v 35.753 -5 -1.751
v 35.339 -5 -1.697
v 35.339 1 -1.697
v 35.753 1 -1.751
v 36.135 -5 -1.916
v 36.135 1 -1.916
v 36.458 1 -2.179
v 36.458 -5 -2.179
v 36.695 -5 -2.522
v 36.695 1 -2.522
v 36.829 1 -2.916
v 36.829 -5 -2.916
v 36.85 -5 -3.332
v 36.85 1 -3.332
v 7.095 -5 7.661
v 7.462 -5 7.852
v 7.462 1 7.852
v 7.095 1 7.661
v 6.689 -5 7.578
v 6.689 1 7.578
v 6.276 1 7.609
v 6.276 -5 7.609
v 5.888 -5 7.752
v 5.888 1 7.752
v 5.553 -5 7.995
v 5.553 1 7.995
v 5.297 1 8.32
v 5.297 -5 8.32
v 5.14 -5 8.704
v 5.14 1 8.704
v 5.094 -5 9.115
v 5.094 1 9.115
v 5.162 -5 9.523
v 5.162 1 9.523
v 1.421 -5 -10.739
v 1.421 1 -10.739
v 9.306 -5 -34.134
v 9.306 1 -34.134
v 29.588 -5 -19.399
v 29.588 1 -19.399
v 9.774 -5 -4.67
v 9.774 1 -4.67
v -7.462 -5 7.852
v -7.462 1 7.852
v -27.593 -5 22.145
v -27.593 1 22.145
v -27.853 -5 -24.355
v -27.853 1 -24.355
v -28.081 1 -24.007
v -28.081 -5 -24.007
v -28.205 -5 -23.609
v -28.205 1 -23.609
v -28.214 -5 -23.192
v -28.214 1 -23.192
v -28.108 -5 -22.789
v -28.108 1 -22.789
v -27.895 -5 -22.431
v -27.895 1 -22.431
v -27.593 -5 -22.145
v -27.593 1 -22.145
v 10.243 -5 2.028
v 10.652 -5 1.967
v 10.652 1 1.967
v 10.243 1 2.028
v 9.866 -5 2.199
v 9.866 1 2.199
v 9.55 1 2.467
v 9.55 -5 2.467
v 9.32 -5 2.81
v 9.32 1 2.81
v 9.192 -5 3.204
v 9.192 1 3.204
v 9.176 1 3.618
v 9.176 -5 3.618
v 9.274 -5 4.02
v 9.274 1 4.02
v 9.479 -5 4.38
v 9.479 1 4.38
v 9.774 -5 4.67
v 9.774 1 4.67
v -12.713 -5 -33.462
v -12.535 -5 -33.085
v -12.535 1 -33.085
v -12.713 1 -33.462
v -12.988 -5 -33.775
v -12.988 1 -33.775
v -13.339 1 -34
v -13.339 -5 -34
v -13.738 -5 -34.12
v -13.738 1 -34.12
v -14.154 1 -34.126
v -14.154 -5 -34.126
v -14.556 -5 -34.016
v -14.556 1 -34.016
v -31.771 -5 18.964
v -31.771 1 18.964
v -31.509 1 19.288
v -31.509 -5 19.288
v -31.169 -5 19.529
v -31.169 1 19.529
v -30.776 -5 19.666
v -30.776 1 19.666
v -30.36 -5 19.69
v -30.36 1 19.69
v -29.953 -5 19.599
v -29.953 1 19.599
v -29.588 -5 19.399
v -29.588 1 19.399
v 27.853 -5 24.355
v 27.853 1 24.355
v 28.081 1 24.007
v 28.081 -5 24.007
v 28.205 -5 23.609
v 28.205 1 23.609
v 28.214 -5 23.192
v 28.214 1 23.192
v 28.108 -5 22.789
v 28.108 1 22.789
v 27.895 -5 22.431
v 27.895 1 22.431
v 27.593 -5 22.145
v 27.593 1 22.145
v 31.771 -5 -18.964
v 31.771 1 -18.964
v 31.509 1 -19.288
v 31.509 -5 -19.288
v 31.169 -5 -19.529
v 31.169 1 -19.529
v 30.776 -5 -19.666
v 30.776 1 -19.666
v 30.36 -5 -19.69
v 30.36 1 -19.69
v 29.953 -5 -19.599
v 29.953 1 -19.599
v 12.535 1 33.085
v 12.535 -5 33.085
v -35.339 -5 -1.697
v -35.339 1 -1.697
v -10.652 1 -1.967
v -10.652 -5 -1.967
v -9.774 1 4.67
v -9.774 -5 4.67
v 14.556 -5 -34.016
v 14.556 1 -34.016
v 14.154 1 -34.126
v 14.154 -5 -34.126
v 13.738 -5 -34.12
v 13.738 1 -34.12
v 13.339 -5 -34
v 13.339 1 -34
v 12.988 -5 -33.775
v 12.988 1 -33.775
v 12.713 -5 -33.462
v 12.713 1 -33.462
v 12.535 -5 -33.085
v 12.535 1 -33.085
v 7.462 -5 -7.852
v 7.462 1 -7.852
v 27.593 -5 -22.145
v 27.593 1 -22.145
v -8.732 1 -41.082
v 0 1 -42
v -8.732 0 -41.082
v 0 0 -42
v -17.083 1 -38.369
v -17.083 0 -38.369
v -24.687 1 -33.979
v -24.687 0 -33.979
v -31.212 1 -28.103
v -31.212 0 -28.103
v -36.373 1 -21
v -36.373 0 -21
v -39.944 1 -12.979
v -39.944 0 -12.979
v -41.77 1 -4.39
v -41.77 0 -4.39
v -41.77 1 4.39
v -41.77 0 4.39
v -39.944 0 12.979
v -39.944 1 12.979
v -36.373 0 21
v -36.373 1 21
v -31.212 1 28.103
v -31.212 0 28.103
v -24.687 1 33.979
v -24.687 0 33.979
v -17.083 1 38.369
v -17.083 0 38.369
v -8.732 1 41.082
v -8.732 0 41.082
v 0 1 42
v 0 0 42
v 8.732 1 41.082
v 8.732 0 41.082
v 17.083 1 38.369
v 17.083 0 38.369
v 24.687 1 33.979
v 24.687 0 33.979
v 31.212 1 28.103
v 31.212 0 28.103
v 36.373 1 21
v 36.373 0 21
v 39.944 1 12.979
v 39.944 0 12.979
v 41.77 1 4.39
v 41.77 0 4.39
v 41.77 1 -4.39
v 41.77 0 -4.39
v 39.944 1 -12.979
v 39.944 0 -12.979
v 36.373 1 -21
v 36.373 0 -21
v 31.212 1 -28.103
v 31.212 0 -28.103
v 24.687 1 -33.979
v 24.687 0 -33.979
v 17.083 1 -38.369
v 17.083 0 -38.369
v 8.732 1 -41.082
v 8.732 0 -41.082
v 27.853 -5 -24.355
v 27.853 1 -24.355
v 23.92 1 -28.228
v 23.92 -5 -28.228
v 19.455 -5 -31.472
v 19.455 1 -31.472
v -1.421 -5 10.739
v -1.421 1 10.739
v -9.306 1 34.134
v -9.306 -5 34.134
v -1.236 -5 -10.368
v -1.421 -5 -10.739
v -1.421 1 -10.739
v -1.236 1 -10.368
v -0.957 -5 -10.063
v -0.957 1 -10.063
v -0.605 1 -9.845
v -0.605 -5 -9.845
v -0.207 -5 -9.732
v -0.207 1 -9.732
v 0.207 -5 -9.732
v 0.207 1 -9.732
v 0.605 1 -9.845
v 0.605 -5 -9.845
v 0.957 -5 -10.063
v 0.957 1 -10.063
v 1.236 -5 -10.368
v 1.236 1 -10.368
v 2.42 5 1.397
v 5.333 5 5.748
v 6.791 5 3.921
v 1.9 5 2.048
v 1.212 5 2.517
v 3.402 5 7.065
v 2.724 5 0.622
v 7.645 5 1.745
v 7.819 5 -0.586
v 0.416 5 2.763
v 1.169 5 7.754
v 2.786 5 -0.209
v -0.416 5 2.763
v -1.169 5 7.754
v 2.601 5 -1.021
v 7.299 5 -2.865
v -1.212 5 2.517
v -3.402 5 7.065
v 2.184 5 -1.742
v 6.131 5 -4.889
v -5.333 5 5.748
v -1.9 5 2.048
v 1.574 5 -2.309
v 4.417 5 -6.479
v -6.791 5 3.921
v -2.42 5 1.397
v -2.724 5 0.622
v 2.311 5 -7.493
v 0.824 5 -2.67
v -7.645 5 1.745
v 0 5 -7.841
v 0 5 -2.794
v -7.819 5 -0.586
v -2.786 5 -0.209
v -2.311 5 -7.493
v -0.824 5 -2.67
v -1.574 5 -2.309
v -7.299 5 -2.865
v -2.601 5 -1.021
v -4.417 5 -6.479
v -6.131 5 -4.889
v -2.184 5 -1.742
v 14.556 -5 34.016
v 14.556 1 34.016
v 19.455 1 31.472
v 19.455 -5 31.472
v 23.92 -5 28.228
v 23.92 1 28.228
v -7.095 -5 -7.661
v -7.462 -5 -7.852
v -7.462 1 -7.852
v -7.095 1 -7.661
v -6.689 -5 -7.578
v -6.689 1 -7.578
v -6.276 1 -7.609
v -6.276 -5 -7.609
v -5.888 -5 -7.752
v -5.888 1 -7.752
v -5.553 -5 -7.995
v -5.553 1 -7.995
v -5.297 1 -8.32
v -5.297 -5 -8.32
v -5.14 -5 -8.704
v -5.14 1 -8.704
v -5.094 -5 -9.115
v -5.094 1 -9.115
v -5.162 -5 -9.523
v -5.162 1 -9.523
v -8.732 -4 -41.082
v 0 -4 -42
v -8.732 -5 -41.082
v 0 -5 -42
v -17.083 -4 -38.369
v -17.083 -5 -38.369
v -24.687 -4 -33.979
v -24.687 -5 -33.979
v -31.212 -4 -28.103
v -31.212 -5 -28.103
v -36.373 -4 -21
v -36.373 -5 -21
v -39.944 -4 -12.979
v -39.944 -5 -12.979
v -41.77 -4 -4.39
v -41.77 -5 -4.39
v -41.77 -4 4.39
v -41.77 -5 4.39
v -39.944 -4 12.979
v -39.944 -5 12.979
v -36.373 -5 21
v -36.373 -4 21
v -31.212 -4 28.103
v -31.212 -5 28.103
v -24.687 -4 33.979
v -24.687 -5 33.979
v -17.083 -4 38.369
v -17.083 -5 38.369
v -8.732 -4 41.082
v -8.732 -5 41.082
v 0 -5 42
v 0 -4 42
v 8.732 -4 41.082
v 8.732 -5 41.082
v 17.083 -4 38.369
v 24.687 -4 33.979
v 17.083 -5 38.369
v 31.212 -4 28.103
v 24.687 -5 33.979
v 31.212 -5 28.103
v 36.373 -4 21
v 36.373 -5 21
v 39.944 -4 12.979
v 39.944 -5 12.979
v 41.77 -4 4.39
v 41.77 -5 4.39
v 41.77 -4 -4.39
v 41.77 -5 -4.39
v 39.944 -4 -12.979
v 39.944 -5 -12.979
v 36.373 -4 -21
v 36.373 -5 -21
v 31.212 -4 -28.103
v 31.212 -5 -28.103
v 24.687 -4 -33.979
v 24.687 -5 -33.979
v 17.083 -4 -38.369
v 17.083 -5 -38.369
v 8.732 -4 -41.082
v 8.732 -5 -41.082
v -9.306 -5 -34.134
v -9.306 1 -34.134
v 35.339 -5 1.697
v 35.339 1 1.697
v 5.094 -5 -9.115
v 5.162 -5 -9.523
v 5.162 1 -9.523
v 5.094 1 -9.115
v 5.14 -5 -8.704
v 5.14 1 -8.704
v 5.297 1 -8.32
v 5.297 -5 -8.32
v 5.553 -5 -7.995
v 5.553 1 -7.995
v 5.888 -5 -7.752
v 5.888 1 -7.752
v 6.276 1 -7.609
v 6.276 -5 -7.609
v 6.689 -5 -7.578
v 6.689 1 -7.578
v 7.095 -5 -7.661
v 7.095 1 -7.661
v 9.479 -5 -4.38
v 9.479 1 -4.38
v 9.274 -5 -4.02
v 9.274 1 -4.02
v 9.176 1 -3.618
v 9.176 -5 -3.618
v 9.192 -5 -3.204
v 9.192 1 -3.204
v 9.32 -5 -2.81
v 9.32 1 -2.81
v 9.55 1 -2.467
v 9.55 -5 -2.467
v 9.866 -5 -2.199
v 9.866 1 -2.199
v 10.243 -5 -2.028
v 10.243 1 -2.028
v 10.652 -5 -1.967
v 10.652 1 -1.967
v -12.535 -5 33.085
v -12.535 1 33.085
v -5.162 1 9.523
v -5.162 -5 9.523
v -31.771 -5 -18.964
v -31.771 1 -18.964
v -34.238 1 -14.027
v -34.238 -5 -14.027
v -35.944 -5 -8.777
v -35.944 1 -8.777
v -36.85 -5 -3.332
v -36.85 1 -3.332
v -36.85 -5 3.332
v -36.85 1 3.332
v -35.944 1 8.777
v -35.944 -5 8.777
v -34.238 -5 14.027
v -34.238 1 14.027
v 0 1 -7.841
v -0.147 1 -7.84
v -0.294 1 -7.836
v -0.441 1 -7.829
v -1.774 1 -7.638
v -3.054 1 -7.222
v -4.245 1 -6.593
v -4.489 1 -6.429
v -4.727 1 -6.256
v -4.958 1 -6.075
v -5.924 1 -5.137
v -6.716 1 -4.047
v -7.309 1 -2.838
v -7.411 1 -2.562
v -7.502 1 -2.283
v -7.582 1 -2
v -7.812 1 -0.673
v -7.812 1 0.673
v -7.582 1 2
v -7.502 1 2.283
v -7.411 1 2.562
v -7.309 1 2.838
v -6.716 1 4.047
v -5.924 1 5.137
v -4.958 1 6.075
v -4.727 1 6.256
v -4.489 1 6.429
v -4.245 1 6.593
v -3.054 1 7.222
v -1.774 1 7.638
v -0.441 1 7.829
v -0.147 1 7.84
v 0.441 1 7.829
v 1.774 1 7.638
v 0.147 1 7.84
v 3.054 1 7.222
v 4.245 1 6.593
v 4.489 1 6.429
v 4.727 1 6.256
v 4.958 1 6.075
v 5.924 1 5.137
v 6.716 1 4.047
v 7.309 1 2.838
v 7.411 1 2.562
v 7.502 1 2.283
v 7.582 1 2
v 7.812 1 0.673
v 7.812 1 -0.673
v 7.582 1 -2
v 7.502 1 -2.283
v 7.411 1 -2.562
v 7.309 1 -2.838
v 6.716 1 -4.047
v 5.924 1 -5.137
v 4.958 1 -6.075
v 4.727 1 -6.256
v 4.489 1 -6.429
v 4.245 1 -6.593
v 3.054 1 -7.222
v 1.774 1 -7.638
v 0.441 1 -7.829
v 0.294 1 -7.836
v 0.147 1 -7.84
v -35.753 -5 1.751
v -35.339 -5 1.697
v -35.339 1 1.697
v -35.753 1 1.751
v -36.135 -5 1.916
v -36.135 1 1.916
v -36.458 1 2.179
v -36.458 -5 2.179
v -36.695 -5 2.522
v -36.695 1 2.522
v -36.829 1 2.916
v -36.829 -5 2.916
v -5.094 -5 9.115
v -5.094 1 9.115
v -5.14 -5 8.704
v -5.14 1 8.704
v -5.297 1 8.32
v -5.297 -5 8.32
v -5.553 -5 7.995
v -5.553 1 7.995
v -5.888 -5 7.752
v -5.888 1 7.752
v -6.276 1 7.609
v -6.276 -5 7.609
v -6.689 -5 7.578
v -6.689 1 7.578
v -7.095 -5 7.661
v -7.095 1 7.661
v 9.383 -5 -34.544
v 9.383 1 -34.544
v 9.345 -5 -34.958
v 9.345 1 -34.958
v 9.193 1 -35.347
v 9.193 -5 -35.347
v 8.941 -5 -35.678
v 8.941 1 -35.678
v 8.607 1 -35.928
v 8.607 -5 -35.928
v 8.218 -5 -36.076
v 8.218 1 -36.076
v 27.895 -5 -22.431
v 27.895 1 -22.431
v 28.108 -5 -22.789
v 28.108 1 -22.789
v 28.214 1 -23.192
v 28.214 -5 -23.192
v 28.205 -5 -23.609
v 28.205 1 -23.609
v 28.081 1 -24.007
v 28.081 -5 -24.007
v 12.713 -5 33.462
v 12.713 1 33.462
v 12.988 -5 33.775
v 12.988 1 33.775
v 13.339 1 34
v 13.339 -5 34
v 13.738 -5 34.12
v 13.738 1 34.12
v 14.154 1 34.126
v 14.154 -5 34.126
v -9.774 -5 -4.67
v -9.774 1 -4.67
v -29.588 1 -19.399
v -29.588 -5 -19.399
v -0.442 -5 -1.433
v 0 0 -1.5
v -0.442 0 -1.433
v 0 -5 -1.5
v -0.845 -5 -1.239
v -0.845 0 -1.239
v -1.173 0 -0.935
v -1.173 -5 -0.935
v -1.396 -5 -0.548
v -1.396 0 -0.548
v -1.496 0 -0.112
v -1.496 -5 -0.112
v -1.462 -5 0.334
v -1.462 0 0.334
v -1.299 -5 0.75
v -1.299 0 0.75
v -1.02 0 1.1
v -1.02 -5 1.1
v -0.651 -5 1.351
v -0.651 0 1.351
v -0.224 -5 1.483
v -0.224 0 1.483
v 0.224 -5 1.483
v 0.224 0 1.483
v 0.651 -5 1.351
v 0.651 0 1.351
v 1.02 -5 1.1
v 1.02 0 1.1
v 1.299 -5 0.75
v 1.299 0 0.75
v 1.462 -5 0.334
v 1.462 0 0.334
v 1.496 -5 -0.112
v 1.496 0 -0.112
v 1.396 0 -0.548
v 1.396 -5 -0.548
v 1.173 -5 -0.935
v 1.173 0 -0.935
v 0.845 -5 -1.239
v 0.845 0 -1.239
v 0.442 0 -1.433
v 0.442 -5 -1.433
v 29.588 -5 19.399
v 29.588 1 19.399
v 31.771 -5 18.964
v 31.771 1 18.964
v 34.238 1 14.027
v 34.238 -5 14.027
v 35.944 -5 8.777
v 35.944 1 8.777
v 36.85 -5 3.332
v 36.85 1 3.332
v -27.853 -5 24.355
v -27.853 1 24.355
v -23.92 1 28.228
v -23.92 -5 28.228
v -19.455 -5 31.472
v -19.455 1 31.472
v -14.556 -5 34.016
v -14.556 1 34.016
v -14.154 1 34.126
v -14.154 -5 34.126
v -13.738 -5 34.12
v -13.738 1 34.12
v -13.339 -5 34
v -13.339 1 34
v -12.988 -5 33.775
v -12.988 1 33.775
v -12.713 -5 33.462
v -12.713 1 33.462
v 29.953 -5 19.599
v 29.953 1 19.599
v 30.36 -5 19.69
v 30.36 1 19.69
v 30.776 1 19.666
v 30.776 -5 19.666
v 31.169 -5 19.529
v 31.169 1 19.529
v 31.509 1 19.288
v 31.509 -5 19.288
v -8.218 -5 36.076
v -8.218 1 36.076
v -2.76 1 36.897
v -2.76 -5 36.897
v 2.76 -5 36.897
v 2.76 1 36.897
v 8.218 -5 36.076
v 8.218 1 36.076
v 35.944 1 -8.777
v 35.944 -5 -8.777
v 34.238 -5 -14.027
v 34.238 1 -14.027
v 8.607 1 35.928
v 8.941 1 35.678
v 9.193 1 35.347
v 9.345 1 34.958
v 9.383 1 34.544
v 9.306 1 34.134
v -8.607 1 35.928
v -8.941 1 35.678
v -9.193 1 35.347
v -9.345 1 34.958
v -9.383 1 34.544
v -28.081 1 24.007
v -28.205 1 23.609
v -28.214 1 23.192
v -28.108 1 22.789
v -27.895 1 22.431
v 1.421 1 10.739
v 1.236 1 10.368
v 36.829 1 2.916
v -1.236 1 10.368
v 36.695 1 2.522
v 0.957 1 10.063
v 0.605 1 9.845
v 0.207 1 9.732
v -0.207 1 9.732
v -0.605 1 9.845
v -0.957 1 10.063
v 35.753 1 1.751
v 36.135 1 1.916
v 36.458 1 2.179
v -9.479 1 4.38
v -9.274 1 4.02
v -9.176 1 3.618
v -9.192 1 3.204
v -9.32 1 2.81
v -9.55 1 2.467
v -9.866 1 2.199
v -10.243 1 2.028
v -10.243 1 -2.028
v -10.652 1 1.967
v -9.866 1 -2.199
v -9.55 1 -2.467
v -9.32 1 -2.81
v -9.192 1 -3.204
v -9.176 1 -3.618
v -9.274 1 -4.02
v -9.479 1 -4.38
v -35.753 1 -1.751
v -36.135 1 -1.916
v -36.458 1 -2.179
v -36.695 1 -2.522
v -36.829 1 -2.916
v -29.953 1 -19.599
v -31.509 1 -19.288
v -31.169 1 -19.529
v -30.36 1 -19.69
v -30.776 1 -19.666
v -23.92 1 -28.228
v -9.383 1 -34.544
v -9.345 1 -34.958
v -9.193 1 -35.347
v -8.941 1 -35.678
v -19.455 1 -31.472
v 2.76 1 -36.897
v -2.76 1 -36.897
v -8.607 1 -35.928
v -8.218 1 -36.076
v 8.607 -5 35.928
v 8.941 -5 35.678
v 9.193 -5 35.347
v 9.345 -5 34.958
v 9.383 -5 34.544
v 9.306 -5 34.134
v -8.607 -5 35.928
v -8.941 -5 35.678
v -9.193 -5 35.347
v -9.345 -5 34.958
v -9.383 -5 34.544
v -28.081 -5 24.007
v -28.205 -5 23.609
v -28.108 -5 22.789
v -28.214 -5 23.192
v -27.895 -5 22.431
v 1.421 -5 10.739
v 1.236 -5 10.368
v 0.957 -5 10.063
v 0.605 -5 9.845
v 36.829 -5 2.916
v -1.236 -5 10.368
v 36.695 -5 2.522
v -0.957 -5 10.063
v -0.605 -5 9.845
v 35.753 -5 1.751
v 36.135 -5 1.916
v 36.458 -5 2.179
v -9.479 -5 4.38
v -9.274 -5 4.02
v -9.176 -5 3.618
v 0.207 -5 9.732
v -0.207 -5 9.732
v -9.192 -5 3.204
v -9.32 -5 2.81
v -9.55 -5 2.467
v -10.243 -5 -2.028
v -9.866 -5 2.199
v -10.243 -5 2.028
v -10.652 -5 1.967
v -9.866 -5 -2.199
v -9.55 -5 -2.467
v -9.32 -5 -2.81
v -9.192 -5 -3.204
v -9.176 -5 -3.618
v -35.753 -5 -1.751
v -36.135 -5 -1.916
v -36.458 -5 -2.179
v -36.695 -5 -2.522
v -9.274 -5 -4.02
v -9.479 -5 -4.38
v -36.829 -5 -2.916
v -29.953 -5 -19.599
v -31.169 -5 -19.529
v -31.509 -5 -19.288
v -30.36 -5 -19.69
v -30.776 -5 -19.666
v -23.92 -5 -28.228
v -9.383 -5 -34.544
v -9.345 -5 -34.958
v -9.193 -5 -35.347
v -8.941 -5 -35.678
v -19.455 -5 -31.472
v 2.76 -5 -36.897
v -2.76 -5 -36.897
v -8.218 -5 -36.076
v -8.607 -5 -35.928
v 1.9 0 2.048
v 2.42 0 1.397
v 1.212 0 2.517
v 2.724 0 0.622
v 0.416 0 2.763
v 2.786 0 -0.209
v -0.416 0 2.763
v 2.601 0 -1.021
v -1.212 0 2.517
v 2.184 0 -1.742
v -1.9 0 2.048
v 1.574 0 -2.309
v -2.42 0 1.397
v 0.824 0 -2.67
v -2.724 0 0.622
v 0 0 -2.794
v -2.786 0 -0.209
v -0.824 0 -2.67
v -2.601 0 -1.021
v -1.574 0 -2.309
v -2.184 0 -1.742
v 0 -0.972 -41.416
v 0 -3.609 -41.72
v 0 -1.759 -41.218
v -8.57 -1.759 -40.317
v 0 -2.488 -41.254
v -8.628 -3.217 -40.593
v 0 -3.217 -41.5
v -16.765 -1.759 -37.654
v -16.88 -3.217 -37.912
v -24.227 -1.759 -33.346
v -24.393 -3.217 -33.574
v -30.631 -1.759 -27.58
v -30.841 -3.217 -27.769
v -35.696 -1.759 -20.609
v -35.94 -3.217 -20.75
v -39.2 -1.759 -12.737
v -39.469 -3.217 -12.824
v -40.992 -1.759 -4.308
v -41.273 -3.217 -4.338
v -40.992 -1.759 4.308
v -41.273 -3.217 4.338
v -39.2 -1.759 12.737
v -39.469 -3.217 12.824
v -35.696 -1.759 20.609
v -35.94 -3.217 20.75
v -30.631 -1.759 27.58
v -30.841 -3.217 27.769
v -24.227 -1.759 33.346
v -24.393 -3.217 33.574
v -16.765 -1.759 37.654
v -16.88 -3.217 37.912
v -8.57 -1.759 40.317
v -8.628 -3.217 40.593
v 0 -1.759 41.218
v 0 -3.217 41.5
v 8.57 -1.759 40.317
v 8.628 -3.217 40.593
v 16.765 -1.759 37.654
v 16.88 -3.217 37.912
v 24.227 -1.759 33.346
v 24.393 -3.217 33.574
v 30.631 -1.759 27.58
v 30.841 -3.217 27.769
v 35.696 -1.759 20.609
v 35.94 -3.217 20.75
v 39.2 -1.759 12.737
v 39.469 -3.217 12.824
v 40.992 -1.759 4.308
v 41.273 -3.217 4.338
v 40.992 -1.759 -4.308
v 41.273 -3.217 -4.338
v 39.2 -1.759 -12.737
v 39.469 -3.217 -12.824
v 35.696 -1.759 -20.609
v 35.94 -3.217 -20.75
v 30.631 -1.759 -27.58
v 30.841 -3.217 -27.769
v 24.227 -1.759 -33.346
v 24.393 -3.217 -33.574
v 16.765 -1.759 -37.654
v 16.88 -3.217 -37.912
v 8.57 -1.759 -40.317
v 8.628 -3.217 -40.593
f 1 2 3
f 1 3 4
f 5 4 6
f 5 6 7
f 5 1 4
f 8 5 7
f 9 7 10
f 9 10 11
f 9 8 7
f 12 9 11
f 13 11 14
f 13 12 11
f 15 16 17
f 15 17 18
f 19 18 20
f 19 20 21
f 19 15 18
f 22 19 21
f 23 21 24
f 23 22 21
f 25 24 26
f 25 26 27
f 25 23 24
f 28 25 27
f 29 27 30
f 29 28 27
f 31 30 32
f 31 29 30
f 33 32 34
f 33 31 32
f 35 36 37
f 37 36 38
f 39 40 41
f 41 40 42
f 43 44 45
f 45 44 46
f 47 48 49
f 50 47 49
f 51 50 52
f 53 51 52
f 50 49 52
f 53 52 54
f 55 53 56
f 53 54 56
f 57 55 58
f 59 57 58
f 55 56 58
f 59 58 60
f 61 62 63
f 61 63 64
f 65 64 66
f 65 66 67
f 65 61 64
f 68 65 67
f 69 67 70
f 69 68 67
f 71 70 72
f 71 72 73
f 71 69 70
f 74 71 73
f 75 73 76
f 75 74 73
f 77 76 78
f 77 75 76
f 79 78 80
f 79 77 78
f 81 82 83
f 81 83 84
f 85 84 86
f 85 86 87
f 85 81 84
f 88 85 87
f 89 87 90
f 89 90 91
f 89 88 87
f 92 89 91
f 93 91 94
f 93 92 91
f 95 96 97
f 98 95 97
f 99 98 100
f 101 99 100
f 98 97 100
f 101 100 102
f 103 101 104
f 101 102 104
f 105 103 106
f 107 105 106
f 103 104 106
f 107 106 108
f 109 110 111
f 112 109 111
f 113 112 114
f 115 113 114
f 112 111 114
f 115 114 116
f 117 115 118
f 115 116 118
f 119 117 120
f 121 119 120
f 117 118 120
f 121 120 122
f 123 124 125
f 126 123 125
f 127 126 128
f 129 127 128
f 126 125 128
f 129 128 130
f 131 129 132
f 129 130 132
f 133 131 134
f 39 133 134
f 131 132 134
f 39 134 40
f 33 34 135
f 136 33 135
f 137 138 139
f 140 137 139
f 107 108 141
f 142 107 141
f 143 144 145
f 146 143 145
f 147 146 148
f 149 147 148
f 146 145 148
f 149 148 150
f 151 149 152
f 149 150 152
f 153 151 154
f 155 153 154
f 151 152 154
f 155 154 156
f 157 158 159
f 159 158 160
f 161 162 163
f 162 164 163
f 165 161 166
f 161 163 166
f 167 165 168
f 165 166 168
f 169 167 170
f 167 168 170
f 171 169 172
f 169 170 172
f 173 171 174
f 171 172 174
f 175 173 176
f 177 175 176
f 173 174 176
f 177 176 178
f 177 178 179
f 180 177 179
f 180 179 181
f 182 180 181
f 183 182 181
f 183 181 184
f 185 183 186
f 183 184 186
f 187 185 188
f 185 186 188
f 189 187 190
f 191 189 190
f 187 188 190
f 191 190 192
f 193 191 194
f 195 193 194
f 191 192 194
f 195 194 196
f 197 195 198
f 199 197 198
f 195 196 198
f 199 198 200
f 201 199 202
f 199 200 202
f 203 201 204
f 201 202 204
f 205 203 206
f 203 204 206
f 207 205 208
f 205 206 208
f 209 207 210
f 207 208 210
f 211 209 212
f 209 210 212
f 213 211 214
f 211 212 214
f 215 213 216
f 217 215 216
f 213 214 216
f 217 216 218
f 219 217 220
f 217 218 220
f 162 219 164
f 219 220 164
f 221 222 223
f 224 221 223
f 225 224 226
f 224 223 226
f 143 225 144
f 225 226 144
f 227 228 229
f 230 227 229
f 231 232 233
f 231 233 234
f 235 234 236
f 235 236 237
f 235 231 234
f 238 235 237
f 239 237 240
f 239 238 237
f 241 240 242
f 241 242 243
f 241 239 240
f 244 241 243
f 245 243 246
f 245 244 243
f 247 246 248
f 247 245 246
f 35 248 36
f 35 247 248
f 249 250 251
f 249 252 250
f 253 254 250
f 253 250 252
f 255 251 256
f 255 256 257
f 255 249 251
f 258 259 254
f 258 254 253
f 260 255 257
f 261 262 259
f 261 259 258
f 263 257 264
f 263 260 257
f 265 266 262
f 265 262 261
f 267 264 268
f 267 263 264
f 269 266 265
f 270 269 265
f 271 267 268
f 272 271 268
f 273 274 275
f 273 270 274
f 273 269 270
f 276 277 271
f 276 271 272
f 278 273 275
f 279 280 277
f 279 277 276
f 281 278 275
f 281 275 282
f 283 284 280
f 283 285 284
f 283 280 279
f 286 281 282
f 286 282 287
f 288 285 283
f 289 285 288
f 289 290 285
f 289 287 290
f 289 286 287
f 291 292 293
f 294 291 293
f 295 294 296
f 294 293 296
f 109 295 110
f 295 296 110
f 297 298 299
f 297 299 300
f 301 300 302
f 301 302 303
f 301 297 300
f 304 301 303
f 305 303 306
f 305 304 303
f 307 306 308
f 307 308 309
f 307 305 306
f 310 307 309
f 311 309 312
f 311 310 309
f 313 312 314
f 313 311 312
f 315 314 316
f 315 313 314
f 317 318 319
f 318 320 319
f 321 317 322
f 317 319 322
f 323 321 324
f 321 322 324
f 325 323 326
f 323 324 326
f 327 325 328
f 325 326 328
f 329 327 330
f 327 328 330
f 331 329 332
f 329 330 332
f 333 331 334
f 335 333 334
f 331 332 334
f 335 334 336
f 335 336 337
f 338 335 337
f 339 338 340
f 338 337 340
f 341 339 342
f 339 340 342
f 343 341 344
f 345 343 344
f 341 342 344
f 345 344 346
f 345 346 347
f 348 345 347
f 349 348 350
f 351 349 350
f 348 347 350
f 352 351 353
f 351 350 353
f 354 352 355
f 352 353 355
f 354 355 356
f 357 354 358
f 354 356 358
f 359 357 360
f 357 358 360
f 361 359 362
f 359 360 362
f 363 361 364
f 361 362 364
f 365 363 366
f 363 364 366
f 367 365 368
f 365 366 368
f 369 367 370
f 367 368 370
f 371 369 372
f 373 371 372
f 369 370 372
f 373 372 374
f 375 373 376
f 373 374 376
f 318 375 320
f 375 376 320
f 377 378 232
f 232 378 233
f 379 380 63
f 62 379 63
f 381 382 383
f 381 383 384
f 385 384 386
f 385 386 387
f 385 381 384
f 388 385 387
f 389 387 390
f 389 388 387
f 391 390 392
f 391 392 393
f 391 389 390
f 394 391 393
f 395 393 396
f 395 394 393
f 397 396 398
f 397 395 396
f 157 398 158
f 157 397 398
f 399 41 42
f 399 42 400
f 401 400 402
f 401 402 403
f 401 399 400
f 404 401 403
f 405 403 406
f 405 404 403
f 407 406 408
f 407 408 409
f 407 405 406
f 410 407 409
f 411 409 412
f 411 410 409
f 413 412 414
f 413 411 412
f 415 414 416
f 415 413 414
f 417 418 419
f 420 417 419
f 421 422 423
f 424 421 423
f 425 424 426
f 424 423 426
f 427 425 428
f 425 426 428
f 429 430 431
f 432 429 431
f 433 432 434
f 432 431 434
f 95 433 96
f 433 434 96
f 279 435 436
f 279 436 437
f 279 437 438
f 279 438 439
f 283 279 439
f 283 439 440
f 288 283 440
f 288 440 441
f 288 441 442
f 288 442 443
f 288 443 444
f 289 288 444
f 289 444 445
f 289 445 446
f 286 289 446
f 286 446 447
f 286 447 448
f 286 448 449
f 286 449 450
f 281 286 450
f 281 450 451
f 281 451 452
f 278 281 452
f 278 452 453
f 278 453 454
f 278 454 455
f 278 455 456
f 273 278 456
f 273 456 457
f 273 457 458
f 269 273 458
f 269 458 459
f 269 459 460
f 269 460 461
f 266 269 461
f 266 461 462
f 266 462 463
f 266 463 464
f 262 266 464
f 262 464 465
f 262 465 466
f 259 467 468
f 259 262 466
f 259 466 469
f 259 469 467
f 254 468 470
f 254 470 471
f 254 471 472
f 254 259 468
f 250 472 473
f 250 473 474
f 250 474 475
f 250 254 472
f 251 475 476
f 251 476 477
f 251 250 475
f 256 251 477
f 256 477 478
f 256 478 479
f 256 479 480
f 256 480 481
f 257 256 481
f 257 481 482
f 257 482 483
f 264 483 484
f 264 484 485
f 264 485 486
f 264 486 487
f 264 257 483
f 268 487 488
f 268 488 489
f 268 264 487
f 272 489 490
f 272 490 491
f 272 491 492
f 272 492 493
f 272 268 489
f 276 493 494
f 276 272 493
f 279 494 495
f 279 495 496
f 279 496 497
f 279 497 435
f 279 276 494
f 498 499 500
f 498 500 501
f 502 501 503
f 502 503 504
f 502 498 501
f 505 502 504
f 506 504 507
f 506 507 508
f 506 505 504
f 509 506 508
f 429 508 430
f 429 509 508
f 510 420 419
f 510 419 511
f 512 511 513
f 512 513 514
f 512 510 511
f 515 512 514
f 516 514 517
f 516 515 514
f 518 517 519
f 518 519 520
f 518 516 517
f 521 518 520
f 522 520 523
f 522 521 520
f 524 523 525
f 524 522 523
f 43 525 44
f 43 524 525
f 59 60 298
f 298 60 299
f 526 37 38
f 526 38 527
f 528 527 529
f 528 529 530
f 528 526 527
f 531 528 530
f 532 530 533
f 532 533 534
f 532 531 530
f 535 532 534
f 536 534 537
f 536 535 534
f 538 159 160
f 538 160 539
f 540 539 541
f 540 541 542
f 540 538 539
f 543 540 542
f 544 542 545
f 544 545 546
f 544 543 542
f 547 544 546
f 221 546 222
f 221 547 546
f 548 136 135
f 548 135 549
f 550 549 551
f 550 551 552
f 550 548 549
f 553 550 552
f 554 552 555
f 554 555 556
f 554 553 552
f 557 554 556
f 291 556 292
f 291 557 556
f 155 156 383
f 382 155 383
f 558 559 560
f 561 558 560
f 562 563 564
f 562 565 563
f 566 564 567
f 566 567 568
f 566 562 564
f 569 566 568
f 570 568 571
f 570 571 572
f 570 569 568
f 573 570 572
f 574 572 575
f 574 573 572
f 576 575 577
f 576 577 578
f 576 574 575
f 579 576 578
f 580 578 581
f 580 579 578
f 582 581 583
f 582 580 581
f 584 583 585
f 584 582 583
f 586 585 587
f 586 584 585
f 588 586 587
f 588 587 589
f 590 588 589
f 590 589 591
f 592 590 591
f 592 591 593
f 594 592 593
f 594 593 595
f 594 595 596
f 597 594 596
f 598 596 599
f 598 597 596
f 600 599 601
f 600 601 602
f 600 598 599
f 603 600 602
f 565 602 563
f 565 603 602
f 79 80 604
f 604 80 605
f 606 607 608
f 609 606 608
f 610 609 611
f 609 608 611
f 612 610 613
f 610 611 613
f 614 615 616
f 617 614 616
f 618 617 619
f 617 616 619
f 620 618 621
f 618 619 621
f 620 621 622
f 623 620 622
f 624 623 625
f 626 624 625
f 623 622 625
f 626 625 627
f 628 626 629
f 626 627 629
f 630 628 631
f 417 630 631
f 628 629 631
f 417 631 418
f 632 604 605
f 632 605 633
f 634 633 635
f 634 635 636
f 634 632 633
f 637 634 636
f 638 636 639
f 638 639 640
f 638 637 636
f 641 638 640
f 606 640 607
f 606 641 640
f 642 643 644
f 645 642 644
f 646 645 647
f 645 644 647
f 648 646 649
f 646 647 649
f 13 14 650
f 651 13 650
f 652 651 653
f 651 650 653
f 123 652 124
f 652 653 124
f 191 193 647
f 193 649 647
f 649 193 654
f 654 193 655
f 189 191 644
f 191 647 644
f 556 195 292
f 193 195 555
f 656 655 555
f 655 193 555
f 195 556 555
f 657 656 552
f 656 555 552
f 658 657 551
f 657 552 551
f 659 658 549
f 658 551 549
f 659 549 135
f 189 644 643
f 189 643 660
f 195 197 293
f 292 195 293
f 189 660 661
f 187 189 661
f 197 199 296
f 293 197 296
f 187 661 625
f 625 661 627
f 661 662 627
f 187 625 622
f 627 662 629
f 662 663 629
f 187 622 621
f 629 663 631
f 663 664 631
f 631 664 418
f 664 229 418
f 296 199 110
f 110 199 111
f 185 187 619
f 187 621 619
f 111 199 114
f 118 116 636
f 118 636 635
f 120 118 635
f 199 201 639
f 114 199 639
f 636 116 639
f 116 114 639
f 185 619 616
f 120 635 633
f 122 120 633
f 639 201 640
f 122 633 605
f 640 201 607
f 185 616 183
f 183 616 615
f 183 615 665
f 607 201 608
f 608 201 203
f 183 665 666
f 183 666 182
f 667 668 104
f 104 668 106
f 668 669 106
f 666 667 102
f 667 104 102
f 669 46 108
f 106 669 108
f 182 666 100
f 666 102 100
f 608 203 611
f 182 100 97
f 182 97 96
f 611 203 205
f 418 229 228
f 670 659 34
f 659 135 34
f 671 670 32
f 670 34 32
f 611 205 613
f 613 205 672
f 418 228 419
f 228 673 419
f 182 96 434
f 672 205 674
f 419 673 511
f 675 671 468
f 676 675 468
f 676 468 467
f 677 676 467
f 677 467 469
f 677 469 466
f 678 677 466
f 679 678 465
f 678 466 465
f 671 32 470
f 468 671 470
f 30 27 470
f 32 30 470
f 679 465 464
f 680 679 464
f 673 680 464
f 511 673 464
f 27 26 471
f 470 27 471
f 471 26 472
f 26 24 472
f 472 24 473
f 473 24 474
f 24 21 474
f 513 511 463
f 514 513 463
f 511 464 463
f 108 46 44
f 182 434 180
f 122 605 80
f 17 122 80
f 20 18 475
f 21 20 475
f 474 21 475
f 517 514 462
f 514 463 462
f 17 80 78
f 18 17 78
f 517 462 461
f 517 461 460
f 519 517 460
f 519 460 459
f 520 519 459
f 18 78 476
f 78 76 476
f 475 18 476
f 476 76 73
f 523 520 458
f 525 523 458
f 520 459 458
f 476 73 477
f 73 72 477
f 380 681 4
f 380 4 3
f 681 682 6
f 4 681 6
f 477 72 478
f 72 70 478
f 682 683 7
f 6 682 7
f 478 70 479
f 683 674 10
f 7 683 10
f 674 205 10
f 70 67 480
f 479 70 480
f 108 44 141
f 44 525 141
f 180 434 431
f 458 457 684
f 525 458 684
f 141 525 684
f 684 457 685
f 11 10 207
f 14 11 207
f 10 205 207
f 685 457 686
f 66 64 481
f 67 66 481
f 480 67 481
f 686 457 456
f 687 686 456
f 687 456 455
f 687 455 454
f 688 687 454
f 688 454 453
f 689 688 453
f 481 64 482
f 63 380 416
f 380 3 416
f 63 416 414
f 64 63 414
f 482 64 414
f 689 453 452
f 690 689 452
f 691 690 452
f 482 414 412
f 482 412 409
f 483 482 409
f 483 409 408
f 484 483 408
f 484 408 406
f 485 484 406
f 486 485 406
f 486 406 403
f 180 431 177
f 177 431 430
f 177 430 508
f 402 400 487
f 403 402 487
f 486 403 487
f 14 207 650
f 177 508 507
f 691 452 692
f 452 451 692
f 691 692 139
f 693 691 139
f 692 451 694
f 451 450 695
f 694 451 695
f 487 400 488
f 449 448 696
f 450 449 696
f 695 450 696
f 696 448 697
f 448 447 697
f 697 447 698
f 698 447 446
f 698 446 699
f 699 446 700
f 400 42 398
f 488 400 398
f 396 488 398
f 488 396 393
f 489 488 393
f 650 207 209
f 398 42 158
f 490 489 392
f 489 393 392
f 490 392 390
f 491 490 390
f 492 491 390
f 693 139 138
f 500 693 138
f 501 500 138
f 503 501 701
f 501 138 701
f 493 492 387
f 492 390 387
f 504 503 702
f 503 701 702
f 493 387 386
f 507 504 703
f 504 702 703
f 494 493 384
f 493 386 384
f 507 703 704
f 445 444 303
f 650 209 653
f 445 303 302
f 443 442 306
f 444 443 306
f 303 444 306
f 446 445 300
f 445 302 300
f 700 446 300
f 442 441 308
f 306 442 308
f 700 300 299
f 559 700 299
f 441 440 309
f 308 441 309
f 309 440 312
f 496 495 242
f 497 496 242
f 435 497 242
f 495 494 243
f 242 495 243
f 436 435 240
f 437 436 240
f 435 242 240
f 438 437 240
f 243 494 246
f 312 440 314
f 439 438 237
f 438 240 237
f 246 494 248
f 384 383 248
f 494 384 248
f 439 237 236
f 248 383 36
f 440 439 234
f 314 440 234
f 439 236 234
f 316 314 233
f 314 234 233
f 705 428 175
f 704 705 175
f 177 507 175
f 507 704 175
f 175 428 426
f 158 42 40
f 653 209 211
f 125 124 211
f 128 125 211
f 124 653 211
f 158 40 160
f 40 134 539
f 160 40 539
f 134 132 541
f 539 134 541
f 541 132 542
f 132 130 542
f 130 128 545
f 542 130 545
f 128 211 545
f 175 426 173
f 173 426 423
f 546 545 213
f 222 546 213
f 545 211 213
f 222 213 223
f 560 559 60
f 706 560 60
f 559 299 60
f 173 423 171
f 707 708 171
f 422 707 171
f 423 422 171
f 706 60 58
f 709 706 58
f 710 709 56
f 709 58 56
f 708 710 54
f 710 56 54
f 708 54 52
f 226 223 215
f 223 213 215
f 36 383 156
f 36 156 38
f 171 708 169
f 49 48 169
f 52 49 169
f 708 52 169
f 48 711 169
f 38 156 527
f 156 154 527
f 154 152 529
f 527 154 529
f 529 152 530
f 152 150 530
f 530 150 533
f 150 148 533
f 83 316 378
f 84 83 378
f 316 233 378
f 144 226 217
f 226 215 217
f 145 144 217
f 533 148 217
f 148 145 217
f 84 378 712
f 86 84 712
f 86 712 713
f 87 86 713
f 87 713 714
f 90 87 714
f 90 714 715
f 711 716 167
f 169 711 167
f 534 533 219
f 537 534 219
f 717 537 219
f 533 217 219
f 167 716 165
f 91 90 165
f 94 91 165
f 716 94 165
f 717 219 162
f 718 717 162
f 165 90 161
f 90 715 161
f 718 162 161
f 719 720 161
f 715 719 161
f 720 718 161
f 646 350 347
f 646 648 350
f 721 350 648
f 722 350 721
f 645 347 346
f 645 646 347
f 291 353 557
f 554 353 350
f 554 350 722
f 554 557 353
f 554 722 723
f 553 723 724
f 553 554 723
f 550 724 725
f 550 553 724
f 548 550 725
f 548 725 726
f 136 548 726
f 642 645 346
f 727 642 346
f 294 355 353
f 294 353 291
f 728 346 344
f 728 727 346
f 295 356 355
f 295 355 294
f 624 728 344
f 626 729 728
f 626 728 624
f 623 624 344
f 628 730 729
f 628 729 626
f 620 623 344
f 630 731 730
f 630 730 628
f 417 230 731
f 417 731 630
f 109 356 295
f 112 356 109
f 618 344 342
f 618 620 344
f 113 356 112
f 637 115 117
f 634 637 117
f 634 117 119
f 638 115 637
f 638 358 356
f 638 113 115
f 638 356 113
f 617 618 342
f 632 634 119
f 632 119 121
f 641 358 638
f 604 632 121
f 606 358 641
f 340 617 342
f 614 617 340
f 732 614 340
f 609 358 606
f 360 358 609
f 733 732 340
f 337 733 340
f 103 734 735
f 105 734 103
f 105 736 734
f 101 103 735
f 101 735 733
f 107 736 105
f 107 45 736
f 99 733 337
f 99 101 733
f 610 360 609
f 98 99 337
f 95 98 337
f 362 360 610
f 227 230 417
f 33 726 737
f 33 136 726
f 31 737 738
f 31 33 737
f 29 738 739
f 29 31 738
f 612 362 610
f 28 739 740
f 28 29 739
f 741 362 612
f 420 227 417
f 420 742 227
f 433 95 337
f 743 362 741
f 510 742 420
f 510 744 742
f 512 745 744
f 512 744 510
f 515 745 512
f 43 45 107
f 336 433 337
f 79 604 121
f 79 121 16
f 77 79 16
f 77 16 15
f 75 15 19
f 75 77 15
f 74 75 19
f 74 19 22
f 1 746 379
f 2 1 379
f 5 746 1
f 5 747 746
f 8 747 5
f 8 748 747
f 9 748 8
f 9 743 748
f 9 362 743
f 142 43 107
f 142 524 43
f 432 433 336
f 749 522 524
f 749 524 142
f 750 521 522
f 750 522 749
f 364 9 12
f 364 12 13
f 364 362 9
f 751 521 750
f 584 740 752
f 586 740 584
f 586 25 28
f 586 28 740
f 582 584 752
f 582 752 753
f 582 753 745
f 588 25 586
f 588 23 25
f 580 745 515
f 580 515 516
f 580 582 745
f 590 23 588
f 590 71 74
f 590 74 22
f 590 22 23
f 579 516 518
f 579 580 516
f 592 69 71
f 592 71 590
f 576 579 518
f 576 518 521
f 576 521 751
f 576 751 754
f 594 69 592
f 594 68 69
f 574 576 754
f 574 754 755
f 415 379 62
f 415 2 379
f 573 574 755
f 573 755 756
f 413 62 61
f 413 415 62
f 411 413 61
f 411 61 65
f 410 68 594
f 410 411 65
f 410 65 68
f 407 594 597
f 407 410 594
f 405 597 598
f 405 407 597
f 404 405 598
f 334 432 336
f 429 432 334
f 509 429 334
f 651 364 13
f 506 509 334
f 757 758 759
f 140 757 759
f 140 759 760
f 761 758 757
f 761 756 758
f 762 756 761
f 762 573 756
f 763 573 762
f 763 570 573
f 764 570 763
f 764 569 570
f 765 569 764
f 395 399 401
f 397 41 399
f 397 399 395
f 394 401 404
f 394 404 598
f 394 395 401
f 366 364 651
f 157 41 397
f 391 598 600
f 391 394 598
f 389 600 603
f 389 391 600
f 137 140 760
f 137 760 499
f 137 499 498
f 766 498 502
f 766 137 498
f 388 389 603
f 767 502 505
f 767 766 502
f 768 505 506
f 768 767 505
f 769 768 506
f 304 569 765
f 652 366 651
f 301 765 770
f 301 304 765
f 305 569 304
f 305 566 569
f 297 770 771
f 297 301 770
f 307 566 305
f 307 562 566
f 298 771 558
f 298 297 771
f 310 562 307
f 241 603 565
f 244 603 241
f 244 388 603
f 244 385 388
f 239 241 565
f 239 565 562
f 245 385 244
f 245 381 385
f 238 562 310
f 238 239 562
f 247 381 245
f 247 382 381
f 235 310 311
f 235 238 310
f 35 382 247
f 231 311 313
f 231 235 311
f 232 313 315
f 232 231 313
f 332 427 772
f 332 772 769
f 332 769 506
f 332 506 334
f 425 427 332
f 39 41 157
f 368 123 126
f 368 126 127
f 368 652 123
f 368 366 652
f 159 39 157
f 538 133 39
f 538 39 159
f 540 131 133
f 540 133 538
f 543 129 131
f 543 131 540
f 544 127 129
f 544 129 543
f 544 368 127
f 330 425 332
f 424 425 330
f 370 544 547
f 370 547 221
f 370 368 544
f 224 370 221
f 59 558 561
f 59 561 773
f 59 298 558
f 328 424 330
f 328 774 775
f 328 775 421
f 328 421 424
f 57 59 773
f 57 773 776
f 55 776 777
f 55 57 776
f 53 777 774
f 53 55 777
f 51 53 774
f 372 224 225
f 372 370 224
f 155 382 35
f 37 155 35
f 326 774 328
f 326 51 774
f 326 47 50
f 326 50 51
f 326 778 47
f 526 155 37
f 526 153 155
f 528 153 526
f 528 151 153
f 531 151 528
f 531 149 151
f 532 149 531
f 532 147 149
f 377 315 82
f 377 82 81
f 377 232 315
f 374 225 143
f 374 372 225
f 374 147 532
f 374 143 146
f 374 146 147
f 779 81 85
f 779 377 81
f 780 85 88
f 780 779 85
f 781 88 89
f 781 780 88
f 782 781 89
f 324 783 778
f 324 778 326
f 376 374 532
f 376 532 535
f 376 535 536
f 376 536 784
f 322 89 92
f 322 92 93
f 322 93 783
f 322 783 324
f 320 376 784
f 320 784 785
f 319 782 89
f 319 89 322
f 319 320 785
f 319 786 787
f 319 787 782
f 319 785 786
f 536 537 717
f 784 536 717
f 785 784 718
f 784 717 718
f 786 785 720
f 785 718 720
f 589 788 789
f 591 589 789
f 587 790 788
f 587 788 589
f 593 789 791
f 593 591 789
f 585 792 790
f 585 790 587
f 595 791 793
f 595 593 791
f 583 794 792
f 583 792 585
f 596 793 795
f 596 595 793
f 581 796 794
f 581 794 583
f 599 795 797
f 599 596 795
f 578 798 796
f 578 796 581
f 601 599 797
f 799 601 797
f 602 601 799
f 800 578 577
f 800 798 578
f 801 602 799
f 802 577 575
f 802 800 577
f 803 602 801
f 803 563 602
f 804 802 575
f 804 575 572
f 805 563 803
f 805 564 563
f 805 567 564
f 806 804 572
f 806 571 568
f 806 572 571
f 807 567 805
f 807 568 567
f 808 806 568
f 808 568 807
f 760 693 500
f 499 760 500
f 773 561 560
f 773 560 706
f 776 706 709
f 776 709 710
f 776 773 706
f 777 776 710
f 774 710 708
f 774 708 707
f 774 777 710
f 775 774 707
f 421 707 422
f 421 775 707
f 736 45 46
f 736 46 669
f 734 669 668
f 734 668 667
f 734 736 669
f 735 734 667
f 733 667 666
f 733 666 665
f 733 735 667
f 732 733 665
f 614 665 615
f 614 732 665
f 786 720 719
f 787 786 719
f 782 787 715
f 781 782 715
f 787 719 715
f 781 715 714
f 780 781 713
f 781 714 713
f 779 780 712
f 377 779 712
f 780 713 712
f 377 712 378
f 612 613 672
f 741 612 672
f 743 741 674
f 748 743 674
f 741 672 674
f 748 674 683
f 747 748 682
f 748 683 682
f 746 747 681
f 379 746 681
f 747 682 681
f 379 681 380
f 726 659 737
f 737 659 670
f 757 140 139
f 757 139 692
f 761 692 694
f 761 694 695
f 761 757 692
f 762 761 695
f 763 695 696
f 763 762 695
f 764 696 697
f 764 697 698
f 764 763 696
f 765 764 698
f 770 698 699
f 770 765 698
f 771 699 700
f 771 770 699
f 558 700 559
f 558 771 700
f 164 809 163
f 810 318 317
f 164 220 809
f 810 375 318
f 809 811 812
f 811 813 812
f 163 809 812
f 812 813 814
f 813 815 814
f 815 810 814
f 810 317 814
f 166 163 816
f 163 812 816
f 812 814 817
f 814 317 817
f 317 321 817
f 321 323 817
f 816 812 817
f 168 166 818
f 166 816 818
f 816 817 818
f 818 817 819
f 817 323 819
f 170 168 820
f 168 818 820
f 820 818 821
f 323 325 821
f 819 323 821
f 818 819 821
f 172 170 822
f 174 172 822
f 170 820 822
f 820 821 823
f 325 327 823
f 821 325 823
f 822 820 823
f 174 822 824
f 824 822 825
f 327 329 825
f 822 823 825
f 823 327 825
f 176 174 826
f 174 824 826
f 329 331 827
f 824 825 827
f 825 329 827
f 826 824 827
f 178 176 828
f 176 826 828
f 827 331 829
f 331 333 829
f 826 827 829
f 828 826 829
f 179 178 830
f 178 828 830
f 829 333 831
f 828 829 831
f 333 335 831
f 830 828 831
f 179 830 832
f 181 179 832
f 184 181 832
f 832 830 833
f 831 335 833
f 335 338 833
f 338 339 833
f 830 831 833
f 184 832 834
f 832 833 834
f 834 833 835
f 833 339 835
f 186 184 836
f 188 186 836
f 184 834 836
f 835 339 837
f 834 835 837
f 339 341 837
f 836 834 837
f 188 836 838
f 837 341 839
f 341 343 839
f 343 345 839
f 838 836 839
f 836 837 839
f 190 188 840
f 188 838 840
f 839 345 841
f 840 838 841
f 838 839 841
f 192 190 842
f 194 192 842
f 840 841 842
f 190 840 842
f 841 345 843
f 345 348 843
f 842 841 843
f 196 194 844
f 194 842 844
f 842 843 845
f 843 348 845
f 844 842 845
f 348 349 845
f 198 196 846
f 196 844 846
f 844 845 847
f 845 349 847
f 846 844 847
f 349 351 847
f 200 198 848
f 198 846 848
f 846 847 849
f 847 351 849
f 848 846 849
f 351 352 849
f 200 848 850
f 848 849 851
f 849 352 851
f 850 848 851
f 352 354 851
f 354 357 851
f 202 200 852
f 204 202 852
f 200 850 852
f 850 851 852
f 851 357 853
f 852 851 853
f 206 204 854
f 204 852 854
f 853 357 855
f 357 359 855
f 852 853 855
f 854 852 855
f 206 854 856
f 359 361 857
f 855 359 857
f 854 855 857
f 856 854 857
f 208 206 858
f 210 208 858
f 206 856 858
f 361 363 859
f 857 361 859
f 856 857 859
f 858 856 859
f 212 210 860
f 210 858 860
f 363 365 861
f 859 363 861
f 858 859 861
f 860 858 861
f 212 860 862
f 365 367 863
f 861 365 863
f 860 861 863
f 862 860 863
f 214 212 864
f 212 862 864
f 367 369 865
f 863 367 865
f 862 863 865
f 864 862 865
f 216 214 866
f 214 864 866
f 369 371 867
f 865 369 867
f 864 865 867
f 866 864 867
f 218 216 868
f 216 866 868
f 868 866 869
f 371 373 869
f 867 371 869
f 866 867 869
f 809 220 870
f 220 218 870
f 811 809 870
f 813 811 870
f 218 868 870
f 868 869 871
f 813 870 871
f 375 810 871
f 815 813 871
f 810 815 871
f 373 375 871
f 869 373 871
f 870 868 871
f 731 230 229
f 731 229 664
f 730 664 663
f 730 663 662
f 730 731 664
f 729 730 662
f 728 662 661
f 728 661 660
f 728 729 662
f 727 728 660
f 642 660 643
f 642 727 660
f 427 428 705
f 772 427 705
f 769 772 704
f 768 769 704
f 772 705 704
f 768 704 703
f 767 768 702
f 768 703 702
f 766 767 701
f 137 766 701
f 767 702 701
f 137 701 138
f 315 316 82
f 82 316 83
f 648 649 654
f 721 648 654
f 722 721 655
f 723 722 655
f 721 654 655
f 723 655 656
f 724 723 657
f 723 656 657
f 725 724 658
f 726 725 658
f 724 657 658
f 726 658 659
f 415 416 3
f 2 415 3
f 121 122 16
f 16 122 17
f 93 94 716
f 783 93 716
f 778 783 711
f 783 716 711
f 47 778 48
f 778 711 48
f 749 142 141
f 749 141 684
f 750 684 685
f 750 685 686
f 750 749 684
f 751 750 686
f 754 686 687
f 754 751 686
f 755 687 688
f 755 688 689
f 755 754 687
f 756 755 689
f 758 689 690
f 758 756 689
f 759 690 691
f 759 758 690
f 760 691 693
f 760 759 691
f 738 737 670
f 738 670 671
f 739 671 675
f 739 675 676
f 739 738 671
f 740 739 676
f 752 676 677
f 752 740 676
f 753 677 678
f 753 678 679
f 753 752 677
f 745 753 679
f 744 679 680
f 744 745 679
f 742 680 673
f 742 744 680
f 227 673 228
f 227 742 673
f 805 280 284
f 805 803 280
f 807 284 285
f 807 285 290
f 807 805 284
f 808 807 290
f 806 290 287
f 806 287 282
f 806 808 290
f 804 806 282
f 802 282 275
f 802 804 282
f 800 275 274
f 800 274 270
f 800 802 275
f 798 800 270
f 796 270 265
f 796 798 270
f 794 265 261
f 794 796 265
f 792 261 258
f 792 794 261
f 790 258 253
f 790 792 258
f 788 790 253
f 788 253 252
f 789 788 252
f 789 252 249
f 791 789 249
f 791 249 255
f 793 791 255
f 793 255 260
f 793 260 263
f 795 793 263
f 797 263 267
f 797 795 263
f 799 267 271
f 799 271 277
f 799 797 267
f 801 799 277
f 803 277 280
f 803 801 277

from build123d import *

# Parameters (mm, degrees)
BOSS_EXTRUDE1_DEPTH = 3
CIRPATTERN1_COUNT   = 10
BOSS_EXTRUDE2_DEPTH = 3
CIRPATTERN3_COUNT   = 10


with BuildPart() as part:
    # Sketch2 → Revolve1 (revolve)
    with BuildSketch(Plane.XY, mode=Mode.PRIVATE) as revolve1_sk:
        Polygon((2.841205436, -5), (7.841205436, -5), (7.841205436, 5), (2.794, 5), (2.794, 0), (1.5, 0), (1.5, -5), align=None)
        with BuildLine():
            Line((42, -4), (42, -5))
            Line((42, -5), (37, -5))
            Line((37, -5), (37, 1))
            Line((37, 1), (42, 1))
            Line((42, 1), (42, 0))
            add(Edge.make_bspline(
                [(42, 0), (40.4125, -2), (42, -4)],
                knots=[0, 0, 0, 1, 1, 1], degree=2))
        make_face()
    revolve(revolve1_sk.sketch.rotate(Axis((0, 0, 0), (0, 1, 0)), 90), axis=Axis((0, 0, 0), (0, 1, 0)))

    # Sketch3 → Boss-Extrude1 (add, symmetric)
    with BuildSketch(Plane(origin=(0, -2, 0), x_dir=(1, 0, 0), z_dir=(0, 1, 0))):
        with BuildLine():
            Line((7.581853512, 2), (36.961862454, 1.679501106))
            ThreePointArc((36.961862454, 1.679501106), (37, 0), (36.961862454, -1.679501106))
            Line((36.961862454, -1.679501106), (7.581853512, -2))
            ThreePointArc((7.581853512, -2), (7.841205436, 0), (7.581853512, 2))
        make_face()
    boss_extrude1 = extrude(amount=BOSS_EXTRUDE1_DEPTH, both=True)

    # CirPattern1: Boss-Extrude1 ×10 about axis
    cirpattern1_axis = Axis((0, 0, 0), (0, 1, 0))
    for i in range(1, CIRPATTERN1_COUNT):
        add(boss_extrude1.rotate(cirpattern1_axis, i * 360 / CIRPATTERN1_COUNT))

    # Sketch4 → Boss-Extrude2 (add, symmetric)
    with BuildSketch(Plane(origin=(0, -2, 0), x_dir=(1, 0, 0), z_dir=(0, 1, 0))):
        with BuildLine():
            Line((4.958277836, -6.074535668), (7.461905948, -7.852127938))
            ThreePointArc((7.461905948, -7.852127938), (5.711839894, -7.861673162), (5.161961694, -9.523135251))
            Line((5.161961694, -9.523135251), (4.245034617, -6.5927372))
            ThreePointArc((4.245034617, -6.5927372), (4.608944915, -6.343668454), (4.958277836, -6.074535668))
        make_face()
        with BuildLine():
            Line((13.019144113, -34.633825757), (12.534602349, -33.085283591))
            ThreePointArc((12.534602349, -33.085283591), (13.338668476, -33.999791988), (14.556277797, -34.016389825))
            ThreePointArc((14.556277797, -34.016389825), (13.791166744, -34.333711128), (13.019144113, -34.633825757))
        make_face()
        with BuildLine():
            Line((27.592569409, -22.145030136), (28.915588887, -23.084382585))
            ThreePointArc((28.915588887, -23.084382585), (28.391594801, -23.725879218), (27.853371989, -24.355485395))
            ThreePointArc((27.853371989, -24.355485395), (28.213848481, -23.192341103), (27.592569409, -22.145030136))
        make_face()
    boss_extrude2 = extrude(amount=BOSS_EXTRUDE2_DEPTH, both=True)

    # CirPattern3: Boss-Extrude2 ×10 about axis
    cirpattern3_axis = Axis((0, 0, 0), (0, 1, 0))
    for i in range(1, CIRPATTERN3_COUNT):
        add(boss_extrude2.rotate(cirpattern3_axis, i * 360 / CIRPATTERN3_COUNT))


solid = part.part
